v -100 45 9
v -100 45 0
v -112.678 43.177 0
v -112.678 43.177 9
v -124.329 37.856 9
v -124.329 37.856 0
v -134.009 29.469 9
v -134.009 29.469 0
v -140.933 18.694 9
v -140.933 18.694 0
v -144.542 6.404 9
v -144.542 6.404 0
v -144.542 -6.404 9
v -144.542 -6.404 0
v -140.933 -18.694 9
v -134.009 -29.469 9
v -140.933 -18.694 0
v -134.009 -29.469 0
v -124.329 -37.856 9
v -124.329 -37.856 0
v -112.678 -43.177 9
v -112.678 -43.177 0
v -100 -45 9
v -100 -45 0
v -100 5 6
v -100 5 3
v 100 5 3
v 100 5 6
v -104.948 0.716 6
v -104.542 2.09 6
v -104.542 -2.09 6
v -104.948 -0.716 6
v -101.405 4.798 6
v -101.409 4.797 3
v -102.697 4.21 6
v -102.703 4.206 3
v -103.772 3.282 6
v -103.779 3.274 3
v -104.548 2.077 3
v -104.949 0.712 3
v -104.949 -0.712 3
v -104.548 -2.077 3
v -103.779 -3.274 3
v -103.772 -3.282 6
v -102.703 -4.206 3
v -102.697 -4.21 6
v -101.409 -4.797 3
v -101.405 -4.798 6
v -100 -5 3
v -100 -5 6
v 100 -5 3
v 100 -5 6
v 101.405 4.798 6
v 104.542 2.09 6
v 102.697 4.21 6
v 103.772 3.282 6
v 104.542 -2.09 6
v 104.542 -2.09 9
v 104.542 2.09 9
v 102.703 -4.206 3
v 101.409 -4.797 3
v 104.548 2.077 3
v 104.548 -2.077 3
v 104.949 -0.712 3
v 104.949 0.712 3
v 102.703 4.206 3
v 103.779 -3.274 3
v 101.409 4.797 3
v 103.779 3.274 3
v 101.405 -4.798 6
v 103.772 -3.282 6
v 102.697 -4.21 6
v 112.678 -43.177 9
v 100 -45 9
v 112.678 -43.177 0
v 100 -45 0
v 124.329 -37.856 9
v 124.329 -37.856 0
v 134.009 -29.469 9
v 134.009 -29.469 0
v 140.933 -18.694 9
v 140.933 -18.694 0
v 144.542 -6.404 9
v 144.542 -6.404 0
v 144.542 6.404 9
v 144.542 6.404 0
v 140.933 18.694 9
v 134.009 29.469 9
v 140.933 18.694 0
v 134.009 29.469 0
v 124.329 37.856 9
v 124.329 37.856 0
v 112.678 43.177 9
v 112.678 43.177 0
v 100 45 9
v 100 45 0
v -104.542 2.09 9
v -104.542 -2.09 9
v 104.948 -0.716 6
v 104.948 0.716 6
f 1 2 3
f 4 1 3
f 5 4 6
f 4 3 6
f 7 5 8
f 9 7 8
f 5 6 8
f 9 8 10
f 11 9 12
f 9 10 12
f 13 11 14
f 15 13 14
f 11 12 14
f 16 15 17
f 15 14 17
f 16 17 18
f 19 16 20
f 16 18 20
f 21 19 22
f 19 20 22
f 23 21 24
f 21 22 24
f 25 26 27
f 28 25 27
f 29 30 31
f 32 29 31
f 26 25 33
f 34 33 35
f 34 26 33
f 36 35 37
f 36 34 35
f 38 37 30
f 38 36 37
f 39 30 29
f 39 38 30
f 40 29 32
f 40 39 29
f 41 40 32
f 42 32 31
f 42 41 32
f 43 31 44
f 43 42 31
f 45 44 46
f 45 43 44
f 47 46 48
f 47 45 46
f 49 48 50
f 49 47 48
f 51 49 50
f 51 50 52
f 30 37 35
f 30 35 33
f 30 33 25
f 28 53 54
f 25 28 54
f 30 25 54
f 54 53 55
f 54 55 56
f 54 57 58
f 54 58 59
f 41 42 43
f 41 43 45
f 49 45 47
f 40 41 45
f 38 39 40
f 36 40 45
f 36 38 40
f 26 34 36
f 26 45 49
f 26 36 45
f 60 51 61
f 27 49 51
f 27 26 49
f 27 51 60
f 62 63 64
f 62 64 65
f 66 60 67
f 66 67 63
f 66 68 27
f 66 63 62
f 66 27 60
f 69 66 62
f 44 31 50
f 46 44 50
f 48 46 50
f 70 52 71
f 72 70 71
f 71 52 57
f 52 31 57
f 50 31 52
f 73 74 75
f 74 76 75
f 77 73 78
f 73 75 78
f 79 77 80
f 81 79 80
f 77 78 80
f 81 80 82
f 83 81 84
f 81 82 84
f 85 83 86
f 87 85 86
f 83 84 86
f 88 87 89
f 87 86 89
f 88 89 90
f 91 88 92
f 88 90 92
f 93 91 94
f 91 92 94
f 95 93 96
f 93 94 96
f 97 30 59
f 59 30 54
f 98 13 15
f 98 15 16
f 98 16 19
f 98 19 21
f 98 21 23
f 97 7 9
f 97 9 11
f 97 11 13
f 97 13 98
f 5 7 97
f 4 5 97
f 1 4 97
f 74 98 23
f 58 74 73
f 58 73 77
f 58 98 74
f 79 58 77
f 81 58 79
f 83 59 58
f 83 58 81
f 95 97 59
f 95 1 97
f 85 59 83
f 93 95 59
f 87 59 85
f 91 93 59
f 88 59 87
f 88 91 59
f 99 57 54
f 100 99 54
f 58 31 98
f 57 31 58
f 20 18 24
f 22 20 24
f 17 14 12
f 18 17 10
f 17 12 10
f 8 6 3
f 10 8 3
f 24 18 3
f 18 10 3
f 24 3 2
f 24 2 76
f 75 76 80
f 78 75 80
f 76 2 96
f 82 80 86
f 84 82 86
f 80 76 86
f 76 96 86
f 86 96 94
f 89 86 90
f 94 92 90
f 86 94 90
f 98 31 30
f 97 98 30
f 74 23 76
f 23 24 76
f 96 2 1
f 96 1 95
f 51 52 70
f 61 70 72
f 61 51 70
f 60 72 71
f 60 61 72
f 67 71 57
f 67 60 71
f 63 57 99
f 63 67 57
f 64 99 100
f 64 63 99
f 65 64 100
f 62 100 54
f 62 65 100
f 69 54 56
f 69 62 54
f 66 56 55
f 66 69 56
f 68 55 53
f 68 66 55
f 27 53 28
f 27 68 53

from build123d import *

# Parameters (mm, degrees)
PAD_DEPTH    = 3
PAD001_DEPTH = 3
SKETCH002_W  = 209.08447
SKETCH002_H  = 4.18
PAD002_DEPTH = 3


with BuildPart() as part:
    # Sketch → Pad (new body)
    with BuildSketch(Plane.XY):
        with BuildLine():
            ThreePointArc((-100, 45), (-145, 0), (-100, -45))
            Line((-100, -45), (100, -45))
            ThreePointArc((100, -45), (145, 0), (100, 45))
            Line((-100, 45), (100, 45))
        make_face()
    extrude(amount=PAD_DEPTH)

    # Sketch001 (on Face6 of Pad) → Pad001 (join)
    with BuildSketch(Plane.XY.offset(3)):
        with BuildLine():
            ThreePointArc((-100, 45), (-145, 0), (-100, -45))
            Line((-100, -45), (100, -45))
            ThreePointArc((100, -45), (145, 0), (100, 45))
            Line((-100, 45), (100, 45))
        make_face()
        with BuildLine():
            ThreePointArc((-100, 5), (-105, 0), (-100, -5))
            Line((-100, -5), (100, -5))
            ThreePointArc((100, -5), (105, 0), (100, 5))
            Line((-100, 5), (100, 5))
        make_face(mode=Mode.SUBTRACT)
    extrude(amount=PAD001_DEPTH)

    # Sketch002 (on Face9 of Pad001) → Pad002 (join)
    with BuildSketch(Plane.XY.offset(6)):
        with BuildLine():
            ThreePointArc((-100, 45), (-145, 0), (-100, -45))
            Line((-100, -45), (100, -45))
            ThreePointArc((100, -45), (145, 0), (100, 45))
            Line((-100, 45), (100, 45))
        make_face()
        Rectangle(SKETCH002_W, SKETCH002_H, mode=Mode.SUBTRACT)
    extrude(amount=PAD002_DEPTH)


solid = part.part
